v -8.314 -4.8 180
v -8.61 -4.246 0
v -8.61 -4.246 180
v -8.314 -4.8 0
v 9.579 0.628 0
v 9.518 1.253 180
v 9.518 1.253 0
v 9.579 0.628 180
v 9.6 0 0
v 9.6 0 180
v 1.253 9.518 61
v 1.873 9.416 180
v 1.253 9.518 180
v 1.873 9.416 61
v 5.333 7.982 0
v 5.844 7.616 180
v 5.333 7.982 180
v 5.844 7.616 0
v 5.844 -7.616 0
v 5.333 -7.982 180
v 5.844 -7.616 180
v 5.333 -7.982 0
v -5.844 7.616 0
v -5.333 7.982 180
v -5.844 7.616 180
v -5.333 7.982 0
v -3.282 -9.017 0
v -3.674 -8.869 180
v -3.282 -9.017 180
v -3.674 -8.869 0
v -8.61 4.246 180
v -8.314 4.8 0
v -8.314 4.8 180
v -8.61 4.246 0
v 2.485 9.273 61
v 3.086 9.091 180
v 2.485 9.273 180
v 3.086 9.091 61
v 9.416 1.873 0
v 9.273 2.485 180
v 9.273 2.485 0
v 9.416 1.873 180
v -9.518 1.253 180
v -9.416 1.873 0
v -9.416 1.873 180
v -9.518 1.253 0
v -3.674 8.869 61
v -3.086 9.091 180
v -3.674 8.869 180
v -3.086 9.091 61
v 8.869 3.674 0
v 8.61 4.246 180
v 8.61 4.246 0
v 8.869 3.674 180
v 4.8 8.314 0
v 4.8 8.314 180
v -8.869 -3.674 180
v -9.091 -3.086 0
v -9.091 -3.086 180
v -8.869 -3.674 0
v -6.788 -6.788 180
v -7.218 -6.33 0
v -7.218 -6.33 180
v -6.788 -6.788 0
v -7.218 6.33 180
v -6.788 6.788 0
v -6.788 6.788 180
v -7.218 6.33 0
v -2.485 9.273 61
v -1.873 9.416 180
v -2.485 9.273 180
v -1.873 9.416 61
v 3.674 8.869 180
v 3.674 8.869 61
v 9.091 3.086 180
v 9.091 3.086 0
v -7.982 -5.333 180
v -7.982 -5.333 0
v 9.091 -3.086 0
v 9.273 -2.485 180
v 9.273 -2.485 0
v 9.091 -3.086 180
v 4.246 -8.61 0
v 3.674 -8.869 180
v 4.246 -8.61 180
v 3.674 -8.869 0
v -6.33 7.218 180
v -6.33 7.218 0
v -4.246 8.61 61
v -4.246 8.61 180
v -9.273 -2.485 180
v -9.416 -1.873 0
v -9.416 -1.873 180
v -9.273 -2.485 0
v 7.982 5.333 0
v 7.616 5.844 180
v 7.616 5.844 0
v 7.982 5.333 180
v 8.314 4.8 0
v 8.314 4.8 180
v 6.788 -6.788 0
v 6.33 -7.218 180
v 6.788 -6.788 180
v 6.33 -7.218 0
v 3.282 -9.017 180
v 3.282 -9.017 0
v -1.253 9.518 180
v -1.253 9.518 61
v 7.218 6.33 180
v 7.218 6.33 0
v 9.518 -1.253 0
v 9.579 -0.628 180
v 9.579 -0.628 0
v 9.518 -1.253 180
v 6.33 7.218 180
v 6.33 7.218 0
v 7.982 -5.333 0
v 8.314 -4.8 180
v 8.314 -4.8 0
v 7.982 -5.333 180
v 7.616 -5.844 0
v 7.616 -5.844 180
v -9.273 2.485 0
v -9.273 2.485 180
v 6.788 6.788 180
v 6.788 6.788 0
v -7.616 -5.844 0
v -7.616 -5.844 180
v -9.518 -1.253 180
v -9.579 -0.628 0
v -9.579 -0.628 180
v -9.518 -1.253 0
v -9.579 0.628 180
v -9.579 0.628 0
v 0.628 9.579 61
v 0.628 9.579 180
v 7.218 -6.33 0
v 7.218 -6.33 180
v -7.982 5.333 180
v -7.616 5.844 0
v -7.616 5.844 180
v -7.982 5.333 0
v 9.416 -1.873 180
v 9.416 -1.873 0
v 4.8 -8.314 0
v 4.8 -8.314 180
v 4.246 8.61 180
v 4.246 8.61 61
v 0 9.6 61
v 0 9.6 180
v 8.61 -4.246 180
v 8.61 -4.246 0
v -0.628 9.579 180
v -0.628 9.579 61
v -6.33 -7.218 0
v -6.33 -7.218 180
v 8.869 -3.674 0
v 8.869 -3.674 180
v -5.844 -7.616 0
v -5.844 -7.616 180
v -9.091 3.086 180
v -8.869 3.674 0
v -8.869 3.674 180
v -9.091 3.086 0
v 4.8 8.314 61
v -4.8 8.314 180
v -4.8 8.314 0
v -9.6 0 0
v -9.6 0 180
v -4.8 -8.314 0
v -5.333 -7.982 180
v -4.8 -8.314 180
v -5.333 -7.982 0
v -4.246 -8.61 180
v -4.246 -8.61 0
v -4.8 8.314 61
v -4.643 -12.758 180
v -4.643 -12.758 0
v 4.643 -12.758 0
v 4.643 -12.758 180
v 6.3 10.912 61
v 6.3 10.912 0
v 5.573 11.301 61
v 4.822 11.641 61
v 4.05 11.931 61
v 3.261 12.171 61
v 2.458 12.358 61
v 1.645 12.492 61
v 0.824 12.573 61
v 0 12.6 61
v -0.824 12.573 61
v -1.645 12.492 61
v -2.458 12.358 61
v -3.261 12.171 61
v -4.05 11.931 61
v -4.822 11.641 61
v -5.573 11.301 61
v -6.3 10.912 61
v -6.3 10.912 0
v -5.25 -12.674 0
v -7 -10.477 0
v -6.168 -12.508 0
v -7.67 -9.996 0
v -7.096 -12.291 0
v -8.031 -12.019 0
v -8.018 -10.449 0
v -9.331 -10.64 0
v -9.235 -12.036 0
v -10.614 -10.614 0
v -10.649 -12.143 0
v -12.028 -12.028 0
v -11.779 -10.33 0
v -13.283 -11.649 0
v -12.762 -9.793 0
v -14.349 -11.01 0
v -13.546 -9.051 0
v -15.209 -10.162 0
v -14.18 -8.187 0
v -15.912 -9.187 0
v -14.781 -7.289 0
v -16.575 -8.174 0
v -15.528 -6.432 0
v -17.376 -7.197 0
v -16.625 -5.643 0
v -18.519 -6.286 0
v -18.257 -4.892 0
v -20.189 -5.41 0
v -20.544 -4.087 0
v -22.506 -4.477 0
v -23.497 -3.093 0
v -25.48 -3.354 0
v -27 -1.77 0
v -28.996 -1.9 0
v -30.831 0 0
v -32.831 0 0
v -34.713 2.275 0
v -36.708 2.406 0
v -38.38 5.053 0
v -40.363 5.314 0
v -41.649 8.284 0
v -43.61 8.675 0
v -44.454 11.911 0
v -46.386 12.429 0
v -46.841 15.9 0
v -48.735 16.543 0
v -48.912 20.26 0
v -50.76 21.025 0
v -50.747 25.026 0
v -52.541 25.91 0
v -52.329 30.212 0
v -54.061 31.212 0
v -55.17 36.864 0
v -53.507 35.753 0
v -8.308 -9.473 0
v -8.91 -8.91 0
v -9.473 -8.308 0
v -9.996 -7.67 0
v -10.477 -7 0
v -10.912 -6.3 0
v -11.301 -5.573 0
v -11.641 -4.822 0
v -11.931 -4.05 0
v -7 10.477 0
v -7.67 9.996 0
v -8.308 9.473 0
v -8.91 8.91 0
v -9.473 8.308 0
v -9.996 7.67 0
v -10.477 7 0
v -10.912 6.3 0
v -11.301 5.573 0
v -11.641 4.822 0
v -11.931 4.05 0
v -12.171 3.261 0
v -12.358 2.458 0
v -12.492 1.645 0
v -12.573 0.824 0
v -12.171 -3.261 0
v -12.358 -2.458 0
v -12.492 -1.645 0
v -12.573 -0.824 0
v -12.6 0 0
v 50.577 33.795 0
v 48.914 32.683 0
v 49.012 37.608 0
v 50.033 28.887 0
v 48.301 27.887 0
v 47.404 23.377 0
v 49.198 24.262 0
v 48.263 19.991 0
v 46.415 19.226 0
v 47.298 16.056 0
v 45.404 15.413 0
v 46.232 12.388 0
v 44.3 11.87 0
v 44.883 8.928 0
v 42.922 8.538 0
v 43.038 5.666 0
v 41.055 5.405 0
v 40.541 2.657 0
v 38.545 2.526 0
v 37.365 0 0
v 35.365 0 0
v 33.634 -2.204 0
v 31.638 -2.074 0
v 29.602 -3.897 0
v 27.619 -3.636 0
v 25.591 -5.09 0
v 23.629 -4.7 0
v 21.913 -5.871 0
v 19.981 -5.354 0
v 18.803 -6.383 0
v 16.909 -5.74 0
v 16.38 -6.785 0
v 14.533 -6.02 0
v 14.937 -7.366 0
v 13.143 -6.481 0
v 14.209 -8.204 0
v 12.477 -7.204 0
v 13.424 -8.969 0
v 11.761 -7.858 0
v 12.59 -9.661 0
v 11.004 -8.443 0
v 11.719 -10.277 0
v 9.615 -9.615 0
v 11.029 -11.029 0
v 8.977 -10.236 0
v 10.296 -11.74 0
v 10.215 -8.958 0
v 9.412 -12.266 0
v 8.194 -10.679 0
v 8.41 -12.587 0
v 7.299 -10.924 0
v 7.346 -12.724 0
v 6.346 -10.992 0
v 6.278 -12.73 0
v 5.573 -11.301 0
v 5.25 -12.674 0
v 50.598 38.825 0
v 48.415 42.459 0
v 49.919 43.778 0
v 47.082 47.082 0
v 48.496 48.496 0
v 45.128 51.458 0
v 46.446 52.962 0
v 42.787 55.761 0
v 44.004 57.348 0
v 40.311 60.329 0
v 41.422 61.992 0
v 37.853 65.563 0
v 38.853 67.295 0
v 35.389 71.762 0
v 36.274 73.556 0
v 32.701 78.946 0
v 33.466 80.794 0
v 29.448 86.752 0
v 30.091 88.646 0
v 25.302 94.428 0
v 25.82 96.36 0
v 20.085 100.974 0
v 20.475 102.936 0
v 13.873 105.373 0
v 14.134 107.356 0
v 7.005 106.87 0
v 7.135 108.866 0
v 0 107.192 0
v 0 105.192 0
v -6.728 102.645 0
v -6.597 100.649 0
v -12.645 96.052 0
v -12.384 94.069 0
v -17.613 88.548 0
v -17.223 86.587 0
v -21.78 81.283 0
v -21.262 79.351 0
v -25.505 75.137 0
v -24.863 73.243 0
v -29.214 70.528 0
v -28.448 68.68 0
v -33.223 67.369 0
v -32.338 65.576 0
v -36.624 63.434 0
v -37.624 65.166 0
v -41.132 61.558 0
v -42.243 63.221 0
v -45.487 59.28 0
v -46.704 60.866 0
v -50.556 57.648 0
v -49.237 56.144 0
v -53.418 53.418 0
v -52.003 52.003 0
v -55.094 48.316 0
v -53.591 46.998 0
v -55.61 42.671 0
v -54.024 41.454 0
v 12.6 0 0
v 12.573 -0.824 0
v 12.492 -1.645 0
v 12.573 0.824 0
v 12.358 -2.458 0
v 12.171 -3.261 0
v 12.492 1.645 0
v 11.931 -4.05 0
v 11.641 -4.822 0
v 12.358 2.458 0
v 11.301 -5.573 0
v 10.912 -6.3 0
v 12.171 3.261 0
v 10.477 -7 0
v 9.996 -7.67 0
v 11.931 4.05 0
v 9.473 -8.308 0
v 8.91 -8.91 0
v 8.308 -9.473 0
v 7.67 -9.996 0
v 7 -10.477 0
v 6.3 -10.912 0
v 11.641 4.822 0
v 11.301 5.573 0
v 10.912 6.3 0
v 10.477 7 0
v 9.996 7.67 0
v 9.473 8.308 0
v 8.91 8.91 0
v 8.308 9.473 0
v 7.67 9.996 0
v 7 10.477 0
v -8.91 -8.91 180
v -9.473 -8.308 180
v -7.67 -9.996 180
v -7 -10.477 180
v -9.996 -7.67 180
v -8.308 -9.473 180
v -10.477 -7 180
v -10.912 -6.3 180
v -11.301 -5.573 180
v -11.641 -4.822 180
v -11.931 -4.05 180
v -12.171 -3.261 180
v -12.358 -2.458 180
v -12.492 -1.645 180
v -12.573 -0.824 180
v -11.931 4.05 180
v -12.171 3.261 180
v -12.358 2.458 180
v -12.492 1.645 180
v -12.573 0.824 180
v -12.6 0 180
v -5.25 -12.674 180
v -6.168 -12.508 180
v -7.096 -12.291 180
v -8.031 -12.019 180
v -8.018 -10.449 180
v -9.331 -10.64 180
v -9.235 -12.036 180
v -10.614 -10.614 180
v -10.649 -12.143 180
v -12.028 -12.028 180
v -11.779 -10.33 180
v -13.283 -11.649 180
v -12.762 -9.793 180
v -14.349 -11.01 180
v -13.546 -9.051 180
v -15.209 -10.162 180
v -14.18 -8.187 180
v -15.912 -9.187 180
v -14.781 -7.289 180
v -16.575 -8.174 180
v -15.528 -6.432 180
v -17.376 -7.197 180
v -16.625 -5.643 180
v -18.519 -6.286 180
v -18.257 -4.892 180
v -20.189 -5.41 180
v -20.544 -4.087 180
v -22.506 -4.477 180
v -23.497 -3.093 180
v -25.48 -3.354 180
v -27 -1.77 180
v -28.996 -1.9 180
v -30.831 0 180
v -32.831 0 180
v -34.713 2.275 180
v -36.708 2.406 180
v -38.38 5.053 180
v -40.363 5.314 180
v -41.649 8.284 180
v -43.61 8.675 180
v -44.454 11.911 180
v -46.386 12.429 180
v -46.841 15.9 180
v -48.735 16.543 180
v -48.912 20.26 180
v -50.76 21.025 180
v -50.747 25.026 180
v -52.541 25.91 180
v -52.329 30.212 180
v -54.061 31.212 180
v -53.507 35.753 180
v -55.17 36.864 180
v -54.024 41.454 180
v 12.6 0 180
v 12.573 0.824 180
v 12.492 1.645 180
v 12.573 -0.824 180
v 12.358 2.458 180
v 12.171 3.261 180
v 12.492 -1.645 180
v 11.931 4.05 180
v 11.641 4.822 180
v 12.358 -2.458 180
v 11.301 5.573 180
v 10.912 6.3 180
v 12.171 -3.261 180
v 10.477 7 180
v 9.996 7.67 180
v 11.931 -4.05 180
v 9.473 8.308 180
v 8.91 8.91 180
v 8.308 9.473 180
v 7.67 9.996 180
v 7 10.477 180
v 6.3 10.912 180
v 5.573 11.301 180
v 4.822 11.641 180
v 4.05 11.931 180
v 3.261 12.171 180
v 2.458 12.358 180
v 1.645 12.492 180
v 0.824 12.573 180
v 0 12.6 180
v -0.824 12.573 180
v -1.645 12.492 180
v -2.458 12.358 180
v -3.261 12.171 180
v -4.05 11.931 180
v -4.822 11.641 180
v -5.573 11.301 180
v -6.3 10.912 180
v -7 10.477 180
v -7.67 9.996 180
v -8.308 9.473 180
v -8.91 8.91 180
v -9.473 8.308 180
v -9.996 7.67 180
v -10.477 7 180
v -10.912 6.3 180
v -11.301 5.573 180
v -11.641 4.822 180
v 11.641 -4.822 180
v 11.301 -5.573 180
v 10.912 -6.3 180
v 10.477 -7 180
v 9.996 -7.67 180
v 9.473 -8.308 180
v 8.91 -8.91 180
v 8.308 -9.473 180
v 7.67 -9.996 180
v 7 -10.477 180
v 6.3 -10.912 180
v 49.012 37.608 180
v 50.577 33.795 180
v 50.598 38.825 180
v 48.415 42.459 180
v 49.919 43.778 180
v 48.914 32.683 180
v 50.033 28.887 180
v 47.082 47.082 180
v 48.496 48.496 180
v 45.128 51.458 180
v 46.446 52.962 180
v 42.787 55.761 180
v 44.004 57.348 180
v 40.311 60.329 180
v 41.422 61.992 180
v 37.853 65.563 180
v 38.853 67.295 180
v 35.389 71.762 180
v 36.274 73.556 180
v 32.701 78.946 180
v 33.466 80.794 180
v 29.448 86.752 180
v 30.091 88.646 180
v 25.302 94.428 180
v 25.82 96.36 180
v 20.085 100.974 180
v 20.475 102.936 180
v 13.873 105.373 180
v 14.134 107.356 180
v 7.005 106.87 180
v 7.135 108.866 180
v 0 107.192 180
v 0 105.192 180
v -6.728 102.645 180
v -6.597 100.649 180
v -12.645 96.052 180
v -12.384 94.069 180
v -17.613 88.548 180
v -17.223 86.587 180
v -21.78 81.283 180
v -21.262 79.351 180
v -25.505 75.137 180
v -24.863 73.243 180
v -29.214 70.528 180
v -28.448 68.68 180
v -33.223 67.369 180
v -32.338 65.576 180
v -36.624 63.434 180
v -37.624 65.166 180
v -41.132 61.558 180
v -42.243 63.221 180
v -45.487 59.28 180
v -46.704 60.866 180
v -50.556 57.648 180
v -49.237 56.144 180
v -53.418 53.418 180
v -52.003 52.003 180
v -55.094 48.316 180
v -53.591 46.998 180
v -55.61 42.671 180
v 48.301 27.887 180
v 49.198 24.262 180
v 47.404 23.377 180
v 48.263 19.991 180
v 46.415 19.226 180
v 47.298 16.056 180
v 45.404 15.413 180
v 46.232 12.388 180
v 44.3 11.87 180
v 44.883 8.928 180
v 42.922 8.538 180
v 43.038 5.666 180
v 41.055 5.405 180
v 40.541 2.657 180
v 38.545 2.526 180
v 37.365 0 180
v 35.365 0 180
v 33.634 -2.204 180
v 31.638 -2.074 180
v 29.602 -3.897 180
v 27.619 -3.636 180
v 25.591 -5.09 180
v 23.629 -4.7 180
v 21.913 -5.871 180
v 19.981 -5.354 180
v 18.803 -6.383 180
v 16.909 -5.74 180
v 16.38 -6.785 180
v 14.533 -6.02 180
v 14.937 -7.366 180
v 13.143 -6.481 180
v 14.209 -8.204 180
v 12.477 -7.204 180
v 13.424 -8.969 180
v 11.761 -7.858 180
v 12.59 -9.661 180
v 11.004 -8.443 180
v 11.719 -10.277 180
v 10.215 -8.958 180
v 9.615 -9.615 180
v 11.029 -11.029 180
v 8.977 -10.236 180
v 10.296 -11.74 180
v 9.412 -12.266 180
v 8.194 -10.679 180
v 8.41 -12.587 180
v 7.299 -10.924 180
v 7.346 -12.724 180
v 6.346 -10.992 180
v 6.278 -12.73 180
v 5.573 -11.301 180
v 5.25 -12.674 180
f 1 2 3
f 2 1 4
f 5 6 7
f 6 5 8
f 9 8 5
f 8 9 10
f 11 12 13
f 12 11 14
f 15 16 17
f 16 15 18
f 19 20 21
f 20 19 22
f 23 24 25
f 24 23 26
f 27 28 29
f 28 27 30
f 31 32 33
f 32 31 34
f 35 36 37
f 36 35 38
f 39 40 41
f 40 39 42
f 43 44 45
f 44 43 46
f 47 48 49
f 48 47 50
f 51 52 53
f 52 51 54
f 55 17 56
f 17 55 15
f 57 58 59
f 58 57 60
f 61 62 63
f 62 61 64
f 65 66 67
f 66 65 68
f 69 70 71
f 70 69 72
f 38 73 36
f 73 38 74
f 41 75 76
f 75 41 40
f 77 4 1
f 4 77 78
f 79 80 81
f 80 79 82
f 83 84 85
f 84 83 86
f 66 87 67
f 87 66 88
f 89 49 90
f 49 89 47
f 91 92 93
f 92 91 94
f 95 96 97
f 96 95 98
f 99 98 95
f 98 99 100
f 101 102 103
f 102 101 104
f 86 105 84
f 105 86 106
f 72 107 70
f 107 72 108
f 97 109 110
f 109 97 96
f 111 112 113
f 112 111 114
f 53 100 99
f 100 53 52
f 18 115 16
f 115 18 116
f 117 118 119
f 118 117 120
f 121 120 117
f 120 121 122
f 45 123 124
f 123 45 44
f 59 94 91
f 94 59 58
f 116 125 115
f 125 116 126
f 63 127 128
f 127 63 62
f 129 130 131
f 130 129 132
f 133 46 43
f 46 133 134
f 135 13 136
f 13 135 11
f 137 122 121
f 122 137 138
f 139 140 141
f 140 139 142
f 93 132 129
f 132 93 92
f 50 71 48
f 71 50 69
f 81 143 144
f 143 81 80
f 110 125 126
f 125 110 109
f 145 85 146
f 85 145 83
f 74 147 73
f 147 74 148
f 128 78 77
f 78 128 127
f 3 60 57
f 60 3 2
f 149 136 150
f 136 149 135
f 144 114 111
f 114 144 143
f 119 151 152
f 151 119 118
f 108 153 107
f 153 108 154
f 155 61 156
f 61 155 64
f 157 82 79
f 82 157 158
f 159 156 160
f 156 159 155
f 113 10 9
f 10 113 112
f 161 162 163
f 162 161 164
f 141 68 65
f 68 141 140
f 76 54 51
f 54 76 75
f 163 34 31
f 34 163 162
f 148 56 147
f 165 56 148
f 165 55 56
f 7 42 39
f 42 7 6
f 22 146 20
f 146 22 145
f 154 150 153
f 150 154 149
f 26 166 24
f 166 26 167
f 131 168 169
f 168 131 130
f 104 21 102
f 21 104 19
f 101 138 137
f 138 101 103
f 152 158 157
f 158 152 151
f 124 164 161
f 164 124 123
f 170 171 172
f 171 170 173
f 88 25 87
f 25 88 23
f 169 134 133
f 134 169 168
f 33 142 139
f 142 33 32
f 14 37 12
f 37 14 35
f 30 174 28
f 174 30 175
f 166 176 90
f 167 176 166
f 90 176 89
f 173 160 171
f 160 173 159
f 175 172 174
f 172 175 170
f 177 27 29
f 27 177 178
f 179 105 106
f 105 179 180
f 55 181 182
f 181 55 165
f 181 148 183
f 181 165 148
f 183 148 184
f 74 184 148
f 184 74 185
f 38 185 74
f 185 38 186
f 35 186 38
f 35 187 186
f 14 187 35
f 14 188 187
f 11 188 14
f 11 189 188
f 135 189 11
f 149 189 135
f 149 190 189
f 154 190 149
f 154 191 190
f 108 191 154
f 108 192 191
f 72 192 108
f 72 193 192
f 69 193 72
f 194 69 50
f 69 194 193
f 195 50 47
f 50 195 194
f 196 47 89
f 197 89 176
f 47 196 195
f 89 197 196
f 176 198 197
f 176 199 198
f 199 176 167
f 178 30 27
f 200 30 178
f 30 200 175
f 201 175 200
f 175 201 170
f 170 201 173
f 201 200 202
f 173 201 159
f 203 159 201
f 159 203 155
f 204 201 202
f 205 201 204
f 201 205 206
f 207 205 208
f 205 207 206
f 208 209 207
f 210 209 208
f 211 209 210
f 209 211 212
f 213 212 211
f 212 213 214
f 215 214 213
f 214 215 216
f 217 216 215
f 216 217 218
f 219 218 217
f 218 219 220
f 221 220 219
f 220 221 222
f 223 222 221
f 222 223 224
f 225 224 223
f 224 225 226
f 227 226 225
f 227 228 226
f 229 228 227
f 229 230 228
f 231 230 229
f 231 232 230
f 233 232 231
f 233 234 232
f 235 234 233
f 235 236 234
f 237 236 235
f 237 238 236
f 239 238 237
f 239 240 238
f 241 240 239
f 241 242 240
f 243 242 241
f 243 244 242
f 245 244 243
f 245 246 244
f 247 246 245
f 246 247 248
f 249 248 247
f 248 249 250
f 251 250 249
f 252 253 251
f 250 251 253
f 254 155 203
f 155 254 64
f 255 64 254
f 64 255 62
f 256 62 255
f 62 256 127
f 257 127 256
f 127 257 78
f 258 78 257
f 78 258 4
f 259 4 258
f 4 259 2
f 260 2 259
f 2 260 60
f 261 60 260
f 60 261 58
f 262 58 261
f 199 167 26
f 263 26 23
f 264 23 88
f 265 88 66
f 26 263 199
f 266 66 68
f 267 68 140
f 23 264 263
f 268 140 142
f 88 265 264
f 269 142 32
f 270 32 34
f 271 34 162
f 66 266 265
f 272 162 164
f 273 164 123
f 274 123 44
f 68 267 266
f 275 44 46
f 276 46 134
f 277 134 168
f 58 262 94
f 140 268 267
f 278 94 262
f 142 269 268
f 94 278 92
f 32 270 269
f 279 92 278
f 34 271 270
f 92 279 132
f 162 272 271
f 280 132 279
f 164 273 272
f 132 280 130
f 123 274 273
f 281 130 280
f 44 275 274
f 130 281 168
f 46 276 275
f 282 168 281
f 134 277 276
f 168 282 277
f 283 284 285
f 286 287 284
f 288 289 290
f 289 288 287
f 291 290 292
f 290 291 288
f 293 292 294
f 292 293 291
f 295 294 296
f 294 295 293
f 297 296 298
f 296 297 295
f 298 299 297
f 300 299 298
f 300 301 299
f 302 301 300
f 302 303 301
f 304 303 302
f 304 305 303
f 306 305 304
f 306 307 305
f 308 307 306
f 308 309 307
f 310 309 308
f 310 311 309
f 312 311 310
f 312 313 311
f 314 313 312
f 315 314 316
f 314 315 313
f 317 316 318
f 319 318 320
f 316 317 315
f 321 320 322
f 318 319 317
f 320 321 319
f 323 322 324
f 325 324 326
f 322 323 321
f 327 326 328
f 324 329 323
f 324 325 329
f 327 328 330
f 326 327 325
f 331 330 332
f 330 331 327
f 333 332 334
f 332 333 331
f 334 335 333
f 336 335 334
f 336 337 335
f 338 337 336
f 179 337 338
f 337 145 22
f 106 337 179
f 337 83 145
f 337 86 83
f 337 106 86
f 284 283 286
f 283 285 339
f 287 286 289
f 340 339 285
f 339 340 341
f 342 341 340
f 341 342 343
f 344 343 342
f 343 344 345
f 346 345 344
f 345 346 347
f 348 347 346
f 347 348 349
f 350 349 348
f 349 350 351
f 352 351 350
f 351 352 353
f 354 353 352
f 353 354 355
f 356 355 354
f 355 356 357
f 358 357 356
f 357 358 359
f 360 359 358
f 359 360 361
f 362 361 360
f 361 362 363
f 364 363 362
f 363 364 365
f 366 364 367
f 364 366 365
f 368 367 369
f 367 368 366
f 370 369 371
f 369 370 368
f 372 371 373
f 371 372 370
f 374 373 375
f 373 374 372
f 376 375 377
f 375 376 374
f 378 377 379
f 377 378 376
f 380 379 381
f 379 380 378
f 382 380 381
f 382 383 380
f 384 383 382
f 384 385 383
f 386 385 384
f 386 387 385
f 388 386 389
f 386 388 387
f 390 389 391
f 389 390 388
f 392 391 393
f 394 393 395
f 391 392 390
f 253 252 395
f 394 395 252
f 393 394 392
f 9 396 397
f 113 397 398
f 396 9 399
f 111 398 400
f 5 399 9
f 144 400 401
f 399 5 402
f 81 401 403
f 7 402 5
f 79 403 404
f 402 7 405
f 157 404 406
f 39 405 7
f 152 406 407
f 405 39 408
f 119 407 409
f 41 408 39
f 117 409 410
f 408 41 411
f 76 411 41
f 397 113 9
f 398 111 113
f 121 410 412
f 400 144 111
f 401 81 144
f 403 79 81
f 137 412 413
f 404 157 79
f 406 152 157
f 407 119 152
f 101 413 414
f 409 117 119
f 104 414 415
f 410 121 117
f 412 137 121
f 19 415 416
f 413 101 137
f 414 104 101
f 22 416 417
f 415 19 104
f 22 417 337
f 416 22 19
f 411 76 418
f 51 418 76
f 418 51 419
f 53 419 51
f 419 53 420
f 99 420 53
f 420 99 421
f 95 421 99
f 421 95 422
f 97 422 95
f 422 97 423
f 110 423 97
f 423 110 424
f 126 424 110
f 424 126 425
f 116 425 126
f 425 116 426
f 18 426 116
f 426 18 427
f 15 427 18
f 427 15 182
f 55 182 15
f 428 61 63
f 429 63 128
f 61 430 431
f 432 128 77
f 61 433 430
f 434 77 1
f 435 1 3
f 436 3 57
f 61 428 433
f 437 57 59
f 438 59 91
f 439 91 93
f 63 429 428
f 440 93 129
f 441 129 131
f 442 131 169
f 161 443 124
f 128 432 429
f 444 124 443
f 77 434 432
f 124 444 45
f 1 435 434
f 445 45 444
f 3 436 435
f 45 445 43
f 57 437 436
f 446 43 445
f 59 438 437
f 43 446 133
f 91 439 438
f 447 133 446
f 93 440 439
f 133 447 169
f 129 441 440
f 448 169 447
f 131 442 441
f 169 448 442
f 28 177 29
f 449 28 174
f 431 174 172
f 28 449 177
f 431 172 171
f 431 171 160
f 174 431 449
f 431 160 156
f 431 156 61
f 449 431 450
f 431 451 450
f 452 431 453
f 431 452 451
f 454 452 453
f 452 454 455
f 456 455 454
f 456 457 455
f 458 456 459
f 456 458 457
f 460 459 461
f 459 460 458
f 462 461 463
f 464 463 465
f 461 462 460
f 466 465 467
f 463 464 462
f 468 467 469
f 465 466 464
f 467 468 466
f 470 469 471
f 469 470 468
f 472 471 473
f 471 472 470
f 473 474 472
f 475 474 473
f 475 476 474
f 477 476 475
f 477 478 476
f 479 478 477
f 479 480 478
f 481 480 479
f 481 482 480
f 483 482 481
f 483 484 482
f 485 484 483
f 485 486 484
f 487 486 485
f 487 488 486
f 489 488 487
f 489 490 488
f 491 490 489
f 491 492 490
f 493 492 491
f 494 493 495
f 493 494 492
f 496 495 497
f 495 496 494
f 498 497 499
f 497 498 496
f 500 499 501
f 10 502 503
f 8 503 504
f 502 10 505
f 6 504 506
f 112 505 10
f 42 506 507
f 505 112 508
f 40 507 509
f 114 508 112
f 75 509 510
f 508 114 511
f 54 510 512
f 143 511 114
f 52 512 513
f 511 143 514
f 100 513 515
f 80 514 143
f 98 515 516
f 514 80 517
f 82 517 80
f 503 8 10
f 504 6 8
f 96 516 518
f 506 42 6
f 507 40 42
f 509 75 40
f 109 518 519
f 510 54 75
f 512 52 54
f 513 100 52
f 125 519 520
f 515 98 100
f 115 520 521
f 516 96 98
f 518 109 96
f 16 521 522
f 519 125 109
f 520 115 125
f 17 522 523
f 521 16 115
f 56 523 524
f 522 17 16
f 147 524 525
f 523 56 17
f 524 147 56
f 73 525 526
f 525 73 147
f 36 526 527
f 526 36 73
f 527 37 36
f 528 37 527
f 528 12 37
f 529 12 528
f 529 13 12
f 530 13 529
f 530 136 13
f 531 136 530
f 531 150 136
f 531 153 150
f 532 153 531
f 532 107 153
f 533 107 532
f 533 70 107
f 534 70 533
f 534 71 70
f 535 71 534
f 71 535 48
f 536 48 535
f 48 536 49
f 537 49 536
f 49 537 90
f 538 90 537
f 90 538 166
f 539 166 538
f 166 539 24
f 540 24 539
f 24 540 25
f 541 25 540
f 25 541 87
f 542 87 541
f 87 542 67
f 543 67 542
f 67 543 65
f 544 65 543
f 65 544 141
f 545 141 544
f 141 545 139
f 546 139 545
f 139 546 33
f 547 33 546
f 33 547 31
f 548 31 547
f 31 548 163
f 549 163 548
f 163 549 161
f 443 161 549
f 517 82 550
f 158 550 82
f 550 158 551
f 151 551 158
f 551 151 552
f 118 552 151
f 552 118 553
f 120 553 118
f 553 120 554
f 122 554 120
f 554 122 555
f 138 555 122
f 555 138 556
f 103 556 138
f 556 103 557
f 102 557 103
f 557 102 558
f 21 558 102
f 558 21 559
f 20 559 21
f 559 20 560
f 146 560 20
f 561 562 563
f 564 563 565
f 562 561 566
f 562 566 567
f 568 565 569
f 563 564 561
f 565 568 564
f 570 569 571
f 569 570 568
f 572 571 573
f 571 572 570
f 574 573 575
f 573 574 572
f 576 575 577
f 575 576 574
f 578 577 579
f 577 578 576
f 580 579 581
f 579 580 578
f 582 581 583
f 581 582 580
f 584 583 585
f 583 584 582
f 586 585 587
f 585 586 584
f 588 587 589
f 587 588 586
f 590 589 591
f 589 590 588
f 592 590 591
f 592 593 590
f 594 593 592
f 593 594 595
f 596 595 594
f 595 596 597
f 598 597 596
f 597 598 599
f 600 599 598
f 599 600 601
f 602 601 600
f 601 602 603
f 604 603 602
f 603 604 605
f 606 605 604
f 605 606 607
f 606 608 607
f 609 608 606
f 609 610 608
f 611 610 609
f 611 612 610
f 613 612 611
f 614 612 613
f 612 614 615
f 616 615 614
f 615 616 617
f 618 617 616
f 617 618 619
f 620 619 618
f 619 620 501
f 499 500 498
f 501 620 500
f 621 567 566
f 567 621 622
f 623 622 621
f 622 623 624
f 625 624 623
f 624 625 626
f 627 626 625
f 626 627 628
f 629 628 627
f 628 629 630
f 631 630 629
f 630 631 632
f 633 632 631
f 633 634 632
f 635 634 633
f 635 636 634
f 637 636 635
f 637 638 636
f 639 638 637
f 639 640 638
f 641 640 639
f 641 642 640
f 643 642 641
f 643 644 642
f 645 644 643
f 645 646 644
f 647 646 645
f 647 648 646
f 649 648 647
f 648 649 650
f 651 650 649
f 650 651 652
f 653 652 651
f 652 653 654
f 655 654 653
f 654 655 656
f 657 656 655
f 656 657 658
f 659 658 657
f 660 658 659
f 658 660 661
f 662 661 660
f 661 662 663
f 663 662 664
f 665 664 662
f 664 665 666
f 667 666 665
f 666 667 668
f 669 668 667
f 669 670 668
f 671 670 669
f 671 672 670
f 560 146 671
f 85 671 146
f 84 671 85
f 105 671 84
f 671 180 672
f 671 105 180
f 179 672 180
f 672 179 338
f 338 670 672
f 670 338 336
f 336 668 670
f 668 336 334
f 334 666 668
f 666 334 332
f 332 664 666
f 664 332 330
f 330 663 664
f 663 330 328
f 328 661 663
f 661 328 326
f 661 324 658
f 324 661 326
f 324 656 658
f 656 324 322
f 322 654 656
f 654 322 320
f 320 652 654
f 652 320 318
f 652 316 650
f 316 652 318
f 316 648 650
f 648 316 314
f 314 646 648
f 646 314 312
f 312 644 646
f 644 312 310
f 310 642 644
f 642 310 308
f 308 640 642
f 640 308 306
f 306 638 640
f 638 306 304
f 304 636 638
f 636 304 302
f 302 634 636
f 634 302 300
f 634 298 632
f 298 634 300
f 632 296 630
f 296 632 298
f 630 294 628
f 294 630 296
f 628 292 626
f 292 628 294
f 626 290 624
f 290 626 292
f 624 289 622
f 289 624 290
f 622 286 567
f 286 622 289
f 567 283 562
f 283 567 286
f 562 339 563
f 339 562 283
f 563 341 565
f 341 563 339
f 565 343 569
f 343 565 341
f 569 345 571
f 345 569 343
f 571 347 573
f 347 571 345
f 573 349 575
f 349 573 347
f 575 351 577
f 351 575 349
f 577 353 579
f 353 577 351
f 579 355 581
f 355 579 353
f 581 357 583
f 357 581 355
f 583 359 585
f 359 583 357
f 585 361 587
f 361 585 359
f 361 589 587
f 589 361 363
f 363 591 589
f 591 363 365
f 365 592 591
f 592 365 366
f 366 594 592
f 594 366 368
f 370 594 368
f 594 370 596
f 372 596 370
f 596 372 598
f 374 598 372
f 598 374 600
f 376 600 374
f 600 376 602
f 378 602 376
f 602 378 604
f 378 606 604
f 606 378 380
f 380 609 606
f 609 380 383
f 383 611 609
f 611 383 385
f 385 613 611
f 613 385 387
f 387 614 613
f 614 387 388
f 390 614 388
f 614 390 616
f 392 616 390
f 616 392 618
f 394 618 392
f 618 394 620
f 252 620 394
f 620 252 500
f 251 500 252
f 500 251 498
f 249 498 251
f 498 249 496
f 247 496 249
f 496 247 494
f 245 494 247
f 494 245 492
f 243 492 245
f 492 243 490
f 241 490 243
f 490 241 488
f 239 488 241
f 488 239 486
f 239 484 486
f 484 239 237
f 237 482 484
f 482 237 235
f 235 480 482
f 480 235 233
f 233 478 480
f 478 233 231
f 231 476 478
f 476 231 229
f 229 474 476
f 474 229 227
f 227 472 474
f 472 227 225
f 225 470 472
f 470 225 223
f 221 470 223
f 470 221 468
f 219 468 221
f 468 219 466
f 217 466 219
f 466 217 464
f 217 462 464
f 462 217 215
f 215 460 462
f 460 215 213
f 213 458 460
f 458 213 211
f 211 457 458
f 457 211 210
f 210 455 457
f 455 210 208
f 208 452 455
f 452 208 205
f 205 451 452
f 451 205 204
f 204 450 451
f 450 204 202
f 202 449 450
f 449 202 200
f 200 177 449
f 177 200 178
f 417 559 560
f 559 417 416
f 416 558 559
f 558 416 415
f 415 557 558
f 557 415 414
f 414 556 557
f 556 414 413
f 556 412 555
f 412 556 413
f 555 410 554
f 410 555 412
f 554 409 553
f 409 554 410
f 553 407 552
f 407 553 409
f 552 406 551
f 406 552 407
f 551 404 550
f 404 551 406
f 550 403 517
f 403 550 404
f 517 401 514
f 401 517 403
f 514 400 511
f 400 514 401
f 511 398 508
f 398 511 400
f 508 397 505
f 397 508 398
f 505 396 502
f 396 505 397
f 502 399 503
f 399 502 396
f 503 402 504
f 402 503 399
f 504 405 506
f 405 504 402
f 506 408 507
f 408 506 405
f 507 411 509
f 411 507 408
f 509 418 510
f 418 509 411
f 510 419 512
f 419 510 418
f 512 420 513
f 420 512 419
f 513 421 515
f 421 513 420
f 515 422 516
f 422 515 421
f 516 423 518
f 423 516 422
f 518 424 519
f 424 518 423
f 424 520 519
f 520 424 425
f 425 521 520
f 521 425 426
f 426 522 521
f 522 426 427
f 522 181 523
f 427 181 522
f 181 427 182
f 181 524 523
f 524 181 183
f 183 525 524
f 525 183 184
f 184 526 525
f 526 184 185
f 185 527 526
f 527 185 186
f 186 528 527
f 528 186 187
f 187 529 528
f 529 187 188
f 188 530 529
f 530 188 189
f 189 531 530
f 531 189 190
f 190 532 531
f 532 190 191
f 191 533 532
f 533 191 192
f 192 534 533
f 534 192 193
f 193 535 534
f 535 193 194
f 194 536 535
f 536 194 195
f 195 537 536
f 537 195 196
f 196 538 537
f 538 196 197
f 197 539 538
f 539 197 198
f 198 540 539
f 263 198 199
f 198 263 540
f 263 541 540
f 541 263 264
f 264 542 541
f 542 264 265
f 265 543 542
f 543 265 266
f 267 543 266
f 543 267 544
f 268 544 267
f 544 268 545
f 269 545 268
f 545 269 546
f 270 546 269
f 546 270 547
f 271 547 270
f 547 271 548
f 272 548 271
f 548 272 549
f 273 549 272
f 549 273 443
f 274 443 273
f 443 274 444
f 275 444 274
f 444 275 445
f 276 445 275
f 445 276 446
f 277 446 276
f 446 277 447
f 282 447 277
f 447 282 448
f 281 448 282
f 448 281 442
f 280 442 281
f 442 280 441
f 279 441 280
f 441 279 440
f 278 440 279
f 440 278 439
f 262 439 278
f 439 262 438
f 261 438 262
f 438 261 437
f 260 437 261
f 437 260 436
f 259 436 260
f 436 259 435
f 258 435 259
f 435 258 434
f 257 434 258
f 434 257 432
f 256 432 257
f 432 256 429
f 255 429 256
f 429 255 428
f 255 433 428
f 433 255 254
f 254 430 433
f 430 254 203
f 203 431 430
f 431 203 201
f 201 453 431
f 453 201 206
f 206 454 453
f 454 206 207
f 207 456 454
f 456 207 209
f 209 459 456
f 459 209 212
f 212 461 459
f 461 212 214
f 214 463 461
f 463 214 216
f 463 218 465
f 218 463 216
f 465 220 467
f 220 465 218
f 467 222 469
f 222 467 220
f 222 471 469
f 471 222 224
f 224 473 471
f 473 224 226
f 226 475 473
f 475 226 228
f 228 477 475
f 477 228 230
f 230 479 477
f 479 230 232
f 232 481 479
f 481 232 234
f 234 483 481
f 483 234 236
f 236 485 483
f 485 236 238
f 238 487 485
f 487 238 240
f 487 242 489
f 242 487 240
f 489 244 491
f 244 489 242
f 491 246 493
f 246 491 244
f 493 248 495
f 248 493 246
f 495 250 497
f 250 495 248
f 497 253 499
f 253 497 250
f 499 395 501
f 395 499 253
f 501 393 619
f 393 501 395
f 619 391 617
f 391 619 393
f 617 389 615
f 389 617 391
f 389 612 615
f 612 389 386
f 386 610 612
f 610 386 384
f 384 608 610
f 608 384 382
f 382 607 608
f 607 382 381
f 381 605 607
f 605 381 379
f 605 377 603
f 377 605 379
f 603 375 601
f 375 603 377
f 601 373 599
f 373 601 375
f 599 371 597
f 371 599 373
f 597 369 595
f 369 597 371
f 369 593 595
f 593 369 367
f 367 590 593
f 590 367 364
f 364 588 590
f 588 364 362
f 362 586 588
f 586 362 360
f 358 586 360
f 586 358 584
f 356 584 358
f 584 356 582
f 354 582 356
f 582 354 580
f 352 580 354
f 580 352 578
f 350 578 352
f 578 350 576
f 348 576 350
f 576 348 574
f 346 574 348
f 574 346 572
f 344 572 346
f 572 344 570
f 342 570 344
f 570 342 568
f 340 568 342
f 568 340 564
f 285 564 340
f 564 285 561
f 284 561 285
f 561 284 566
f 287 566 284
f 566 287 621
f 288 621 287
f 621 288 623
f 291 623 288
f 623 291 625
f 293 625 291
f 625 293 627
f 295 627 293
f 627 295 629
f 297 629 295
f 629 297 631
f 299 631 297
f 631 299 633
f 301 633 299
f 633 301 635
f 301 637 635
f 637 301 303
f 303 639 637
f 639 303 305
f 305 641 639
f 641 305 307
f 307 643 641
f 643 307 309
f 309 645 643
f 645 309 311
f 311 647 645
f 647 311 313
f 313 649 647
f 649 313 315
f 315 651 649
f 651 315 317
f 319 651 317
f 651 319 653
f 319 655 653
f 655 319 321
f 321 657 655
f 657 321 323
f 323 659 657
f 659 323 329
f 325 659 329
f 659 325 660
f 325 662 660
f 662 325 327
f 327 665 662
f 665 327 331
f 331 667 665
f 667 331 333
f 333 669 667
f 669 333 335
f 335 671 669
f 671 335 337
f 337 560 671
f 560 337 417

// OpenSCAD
// Lampenschirm für Stehlampe – organischer, wellenförmiger Querschnitt
// mit Klemmkragen, der in die Form integriert ist (keine D-Form mehr)
// Alle Maße in Millimetern (Regel: units-mm)
//
// Kontext: context/printer.md, context/tolerances.md und context/materials.md
// waren zum Zeitpunkt der Modellierung leer (siehe Regel: context-first).
// Annahmen aus dem Design-Dialog (siehe auch 001/002):
//   - Baubett >= 200mm Z-Höhe vorhanden -> Schirm wird als ein Teil,
//     stehend, in voller Höhe gedruckt.
//   - Klemmkragen als offener Federclip (C-Ring): Innendurchmesser 0.8mm
//     unter Stangendurchmesser (19.2mm ID auf 20mm Stange) für Vorspannung.
//   - E14-Fassung wird separat an der Stange montiert.
//
// Änderungen gegenüber 012 (Nutzer-Feedback: "Auswüchse an der Klemme immer
// noch da"):
//   - Erster Versuch (harte Untergrenze neck_floor, weich von min_r bis
//     safe_floor_far über floor_relax_width=90°) verhinderte zwar neue
//     ungeschützte VERBINDUNGEN zum Klemmenradius, behob aber NICHT das
//     eigentliche visuelle Problem: die "Flügel" waren gar kein entartetes
//     Polygon (kein Selbstschnitt, kein Hohlraum in der Nahaufnahme) -
//     sondern ein echter, glatter, aber stark UNPROPORTIONALER lokaler
//     Wellen-Peak direkt neben dem 13mm engen Hals (z.B. Radius 23mm bei
//     nur 50° Abstand), der optisch wie ein Auswuchs wirkt, weil die feste
//     Wellenamplitude (±15mm) dort schon fast voll durchschlug, während die
//     Grundform selbst erst ~15mm groß war.
//   - Fix: die Wellenamplitude skaliert jetzt PROPORTIONAL zur lokalen
//     Grundform-Größe (wave_scale = base(θ)/front_r) statt nur über eine
//     feste Winkel-Hüllkurve gedämpft zu werden. Dadurch ist die Welle nahe
//     des engen Halses von selbst winzig (13/95 ≈ 14% der vollen Amplitude)
//     und wächst erst mit der Kontur selbst auf volle Stärke - keine
//     Sonderbehandlung für einen bestimmten Winkelbereich nötig, das
//     Verhältnis Welle:Grundform bleibt überall ähnlich. neck_cap/neck_floor
//     bleiben zusätzlich als Sicherheitsnetz erhalten (siehe Regel
//     `verify-parametric-geometry`).
//   - Per Sweep verifiziert: "verbundene" Winkel (organic_r <= clip_r_out+
//     wall_t) kommen jetzt nur noch in EINER einzigen Zone um die Rückseite
//     vor, keine unproportionalen Spitzen mehr in der Nahaufnahme.

// ---- Parameter ----
shade_height = 180;   // Gesamthöhe des Schirms
wall_t       = 2;     // Wandstärke Schirm (durchgehend, auch am Klemmkragen-Übergang)

rod_d      = 20;                 // Durchmesser der Metallstange
rod_r      = rod_d / 2;
clip_id    = 19.2;               // Innendurchmesser Klemmkragen (Vorspannung, ~0.8mm Untermaß)
clip_r_in  = clip_id / 2;
clip_wall  = 3;                  // Wandstärke Klemmkragen (dicker als Schirmwand, für Klemmkraft)
clip_r_out = clip_r_in + clip_wall;
clip_gap_deg = 40;               // Öffnungswinkel des C-Rings (Montagespalt, zeigt nach -Y)

socket_slot_deg    = 60;              // Öffnungswinkel des Fassungs-Schlitzes (Innenseite, +Y) - Annahme
socket_slot_height = shade_height / 3; // unteres Drittel der Klemme ist auf der Innenseite offen

// Organische Grundform: Potenzfunktion statt Fourier-Reihe, damit die
// Rückseite (θ=270°) über einen breiten Winkelbereich flach bleibt, statt
// steil anzusteigen.
back_r  = 13;     // Zielradius an der Rückseite (θ=270°) - eng am Klemmkragen
front_r = 95;      // Zielradius an der Front (θ=90°)
flatten_power = 2; // höher = flacherer/breiterer "Hals" um die Klemme, aber schmalere Seiten

// Wellen-Überlagerung für den organischen/wellenförmigen Look (Front/Seiten).
// Amplitude wird in organic_r() proportional zur lokalen Grundform-Größe
// skaliert (wave_scale = base/front_r) statt über eine feste Winkel-
// Hüllkurve gedämpft - dadurch bleibt das Verhältnis Welle:Kontur überall
// ähnlich, keine unproportionalen Spitzen nahe des engen Halses.
wave_amp1 = 10;  wave_freq1 = 5;  wave_phase1 = 40;
wave_amp2 = 5;   wave_freq2 = 8;  wave_phase2 = 115;

// Sicherheitsgrenzen nahe der Rückseite: sowohl Deckel (neck_cap, verhindert
// zu großen Radius) als auch Untergrenze (neck_floor, verhindert zu kleinen
// Radius außerhalb der Rückseiten-Zone) wachsen WEICH statt hart abzu-
// schneiden. neck_cap braucht nur bis neck_guard_width Wirkung (die Basis-
// form selbst wächst dort schon steil genug), neck_floor muss deutlich
// weiter wirken (floor_relax_width), weil die Grundform erst dort von sich
// aus groß genug ist, um der vollen Wellenamplitude sicher zu widerstehen.
neck_guard_width  = 40;                    // Breite für den oberen Deckel (neck_cap)
floor_relax_width = 90;                    // Breite für die Untergrenze (neck_floor) - per Sweep ermittelt
max_neck_r    = clip_r_out + wall_t - 0.3; // = 14.3mm, garantiert Überlappung mit Sicherheitsabstand
min_r         = 13.0;                       // Untergrenze an der Rückseite selbst, IMMER > clip_r_out
safe_floor_far = clip_r_out + wall_t + 3;  // = 17.6mm, sicherer Abstand zum Klemmenradius abseits der Rückseite
cap_relax_far  = 1000;                      // "praktisch unbegrenzt" für den ausgelaufenen Deckel

cut_far = 300;   // "unendlich" großer Radius für Schnitte, die garantiert bis nach außen durchbrechen sollen

$fn = 96;

// Winkelabstand zwischen theta und center (0-180°, robust über den 0°/360°-Übergang)
function angle_diff(theta, center) =
    let(d = abs(theta - center))
    (d > 180) ? 360 - d : d;

// Weicher Übergang 0->1 zwischen edge0 und edge1 (klassisches smoothstep)
function smoothstep(edge0, edge1, x) =
    let(t = min(max((x - edge0) / (edge1 - edge0), 0), 1))
    t * t * (3 - 2 * t);

// Deckel (Obergrenze) nahe der Rückseite: startet bei max_neck_r (d=0) und
// wächst weich auf cap_relax_far (d>=neck_guard_width) - verhindert einen zu
// GROSSEN Radius direkt an der Klemme, unabhängig von der Wellenamplitude.
function neck_cap(d) =
    max_neck_r + (cap_relax_far - max_neck_r) * smoothstep(0, neck_guard_width, d);

// Untergrenze abseits der Rückseite: startet bei min_r (d=0, erlaubt die
// beabsichtigte enge Passage) und wächst weich auf safe_floor_far
// (d>=floor_relax_width) - verhindert, dass die freie Welle die Kontur an
// UNBEABSICHTIGTEN Winkeln nah genug an den Klemmenradius zieht, um dort
// eine ungeschützte (Artefakt-anfällige) Kreuzung zu erzeugen.
function neck_floor(d) =
    min_r + (safe_floor_far - min_r) * smoothstep(0, floor_relax_width, d);

// Radius der organischen Außenkontur in Abhängigkeit vom Winkel θ (Grad)
function organic_r(theta) =
    let(phi = theta - 90)
    let(u = (1 + cos(phi)) / 2)   // 0 an der Rückseite (θ=270°), 1 an der Front (θ=90°)
    let(base = back_r + (front_r - back_r) * pow(u, flatten_power))
    let(raw_wave = wave_amp1 * sin(wave_freq1 * theta + wave_phase1)
                 + wave_amp2 * sin(wave_freq2 * theta + wave_phase2))
    let(wave_scale = base / front_r)   // proportional zur lokalen Kontur-Größe
    let(wave = raw_wave * wave_scale)
    let(r_free = base + wave)
    let(d = angle_diff(theta, 270))
    let(r_capped = min(r_free, neck_cap(d)))
    max(r_capped, neck_floor(d));

// Radius der Kavität (Hohlraum-Grenze): normale Wandinnenseite, aber nie
// enger als der Klemmkragen (clip_r_out) - dadurch bleibt der Kragen überall
// solide statt hohl, ganz ohne separate Kreis-Verschneidung.
function cavity_r(theta) =
    max(organic_r(theta) - wall_t, clip_r_out);

// Geschlossenes 2D-Profil, um shrink (mm) nach innen verkleinert
module organic_outline(shrink = 0) {
    step = 360 / $fn;
    polygon(points = [
        for (t = [0 : step : 360 - step])
            [(organic_r(t) - shrink) * cos(t), (organic_r(t) - shrink) * sin(t)]
    ]);
}

// Ringform (Annulus): gefüllte Fläche bis cavity_r(θ) MINUS Kreis(clip_r_out).
// Wichtig: eine reine gefüllte Fläche bis cavity_r(θ) wäre FALSCH - da
// cavity_r(θ) an Winkeln fern der Rückseite sehr groß wird (z.B. ~93mm an
// der Front), würde eine gefüllte Fläche dort den kompletten Klemmkragen
// mit-entfernen. Der Kreisabzug stellt sicher, dass r < clip_r_out IMMER
// massiv bleibt, unabhängig vom Winkel.
module cavity_outline() {
    step = 360 / $fn;
    difference() {
        polygon(points = [
            for (t = [0 : step : 360 - step])
                [cavity_r(t) * cos(t), cavity_r(t) * sin(t)]
        ]);
        circle(r = clip_r_out);
    }
}

// Keilförmiger 2D-Ausschnitt, zentriert auf Winkel 0
module pie_wedge_2d(radius, angle_deg) {
    a = angle_deg / 2;
    polygon(points = [
        [0, 0],
        [radius * cos(a), radius * sin(a)],
        [radius * cos(-a), radius * sin(-a)]
    ]);
}

// 2D-Profil der Wand: durchgehend wall_t dick, mit massivem, nahtlos
// integriertem Klemmkragen-Rohling an der Rückseite
module shell_with_boss_2d() {
    difference() {
        organic_outline(0);
        cavity_outline();
    }
}

module organic_shell() {
    linear_extrude(height = shade_height)
        shell_with_boss_2d();
}

// Radialer Schlitz von z0 bis z1, in Richtung facing_deg ausgerichtet
module radial_slot(radius, angle_deg, facing_deg, z0, z1) {
    translate([0, 0, z0])
        rotate([0, 0, facing_deg])
            linear_extrude(z1 - z0)
                pie_wedge_2d(radius, angle_deg);
}

// Alle Ausschnitte für die Klemme: durchgehende Stangenbohrung + Montagespalt
// (volle Höhe, -Y, bricht bis zur echten Außenwand durch, damit seitlich
// eingeclipst werden kann) + Fassungs-Schlitz (unteres Drittel, +Y, öffnet
// nur bis in den ohnehin dort schon hohlen Innenraum)
module clamp_cutouts() {
    union() {
        translate([0, 0, -1])
            cylinder(r = clip_r_in, h = shade_height + 2);

        radial_slot(cut_far, clip_gap_deg, 270, -1, shade_height + 1);

        radial_slot(clip_r_out + 5, socket_slot_deg, 90, -1, socket_slot_height + 1);
    }
}

// render() erzwingt die vollständige (exakte) Boolesche Berechnung statt der
// schnellen OpenCSG-Live-Vorschau, damit die Klemme auch in der OpenSCAD-
// Vorschau (F5) korrekt dargestellt wird.
render(convexity = 10)
    difference() {
        organic_shell();
        clamp_cutouts();
    }
